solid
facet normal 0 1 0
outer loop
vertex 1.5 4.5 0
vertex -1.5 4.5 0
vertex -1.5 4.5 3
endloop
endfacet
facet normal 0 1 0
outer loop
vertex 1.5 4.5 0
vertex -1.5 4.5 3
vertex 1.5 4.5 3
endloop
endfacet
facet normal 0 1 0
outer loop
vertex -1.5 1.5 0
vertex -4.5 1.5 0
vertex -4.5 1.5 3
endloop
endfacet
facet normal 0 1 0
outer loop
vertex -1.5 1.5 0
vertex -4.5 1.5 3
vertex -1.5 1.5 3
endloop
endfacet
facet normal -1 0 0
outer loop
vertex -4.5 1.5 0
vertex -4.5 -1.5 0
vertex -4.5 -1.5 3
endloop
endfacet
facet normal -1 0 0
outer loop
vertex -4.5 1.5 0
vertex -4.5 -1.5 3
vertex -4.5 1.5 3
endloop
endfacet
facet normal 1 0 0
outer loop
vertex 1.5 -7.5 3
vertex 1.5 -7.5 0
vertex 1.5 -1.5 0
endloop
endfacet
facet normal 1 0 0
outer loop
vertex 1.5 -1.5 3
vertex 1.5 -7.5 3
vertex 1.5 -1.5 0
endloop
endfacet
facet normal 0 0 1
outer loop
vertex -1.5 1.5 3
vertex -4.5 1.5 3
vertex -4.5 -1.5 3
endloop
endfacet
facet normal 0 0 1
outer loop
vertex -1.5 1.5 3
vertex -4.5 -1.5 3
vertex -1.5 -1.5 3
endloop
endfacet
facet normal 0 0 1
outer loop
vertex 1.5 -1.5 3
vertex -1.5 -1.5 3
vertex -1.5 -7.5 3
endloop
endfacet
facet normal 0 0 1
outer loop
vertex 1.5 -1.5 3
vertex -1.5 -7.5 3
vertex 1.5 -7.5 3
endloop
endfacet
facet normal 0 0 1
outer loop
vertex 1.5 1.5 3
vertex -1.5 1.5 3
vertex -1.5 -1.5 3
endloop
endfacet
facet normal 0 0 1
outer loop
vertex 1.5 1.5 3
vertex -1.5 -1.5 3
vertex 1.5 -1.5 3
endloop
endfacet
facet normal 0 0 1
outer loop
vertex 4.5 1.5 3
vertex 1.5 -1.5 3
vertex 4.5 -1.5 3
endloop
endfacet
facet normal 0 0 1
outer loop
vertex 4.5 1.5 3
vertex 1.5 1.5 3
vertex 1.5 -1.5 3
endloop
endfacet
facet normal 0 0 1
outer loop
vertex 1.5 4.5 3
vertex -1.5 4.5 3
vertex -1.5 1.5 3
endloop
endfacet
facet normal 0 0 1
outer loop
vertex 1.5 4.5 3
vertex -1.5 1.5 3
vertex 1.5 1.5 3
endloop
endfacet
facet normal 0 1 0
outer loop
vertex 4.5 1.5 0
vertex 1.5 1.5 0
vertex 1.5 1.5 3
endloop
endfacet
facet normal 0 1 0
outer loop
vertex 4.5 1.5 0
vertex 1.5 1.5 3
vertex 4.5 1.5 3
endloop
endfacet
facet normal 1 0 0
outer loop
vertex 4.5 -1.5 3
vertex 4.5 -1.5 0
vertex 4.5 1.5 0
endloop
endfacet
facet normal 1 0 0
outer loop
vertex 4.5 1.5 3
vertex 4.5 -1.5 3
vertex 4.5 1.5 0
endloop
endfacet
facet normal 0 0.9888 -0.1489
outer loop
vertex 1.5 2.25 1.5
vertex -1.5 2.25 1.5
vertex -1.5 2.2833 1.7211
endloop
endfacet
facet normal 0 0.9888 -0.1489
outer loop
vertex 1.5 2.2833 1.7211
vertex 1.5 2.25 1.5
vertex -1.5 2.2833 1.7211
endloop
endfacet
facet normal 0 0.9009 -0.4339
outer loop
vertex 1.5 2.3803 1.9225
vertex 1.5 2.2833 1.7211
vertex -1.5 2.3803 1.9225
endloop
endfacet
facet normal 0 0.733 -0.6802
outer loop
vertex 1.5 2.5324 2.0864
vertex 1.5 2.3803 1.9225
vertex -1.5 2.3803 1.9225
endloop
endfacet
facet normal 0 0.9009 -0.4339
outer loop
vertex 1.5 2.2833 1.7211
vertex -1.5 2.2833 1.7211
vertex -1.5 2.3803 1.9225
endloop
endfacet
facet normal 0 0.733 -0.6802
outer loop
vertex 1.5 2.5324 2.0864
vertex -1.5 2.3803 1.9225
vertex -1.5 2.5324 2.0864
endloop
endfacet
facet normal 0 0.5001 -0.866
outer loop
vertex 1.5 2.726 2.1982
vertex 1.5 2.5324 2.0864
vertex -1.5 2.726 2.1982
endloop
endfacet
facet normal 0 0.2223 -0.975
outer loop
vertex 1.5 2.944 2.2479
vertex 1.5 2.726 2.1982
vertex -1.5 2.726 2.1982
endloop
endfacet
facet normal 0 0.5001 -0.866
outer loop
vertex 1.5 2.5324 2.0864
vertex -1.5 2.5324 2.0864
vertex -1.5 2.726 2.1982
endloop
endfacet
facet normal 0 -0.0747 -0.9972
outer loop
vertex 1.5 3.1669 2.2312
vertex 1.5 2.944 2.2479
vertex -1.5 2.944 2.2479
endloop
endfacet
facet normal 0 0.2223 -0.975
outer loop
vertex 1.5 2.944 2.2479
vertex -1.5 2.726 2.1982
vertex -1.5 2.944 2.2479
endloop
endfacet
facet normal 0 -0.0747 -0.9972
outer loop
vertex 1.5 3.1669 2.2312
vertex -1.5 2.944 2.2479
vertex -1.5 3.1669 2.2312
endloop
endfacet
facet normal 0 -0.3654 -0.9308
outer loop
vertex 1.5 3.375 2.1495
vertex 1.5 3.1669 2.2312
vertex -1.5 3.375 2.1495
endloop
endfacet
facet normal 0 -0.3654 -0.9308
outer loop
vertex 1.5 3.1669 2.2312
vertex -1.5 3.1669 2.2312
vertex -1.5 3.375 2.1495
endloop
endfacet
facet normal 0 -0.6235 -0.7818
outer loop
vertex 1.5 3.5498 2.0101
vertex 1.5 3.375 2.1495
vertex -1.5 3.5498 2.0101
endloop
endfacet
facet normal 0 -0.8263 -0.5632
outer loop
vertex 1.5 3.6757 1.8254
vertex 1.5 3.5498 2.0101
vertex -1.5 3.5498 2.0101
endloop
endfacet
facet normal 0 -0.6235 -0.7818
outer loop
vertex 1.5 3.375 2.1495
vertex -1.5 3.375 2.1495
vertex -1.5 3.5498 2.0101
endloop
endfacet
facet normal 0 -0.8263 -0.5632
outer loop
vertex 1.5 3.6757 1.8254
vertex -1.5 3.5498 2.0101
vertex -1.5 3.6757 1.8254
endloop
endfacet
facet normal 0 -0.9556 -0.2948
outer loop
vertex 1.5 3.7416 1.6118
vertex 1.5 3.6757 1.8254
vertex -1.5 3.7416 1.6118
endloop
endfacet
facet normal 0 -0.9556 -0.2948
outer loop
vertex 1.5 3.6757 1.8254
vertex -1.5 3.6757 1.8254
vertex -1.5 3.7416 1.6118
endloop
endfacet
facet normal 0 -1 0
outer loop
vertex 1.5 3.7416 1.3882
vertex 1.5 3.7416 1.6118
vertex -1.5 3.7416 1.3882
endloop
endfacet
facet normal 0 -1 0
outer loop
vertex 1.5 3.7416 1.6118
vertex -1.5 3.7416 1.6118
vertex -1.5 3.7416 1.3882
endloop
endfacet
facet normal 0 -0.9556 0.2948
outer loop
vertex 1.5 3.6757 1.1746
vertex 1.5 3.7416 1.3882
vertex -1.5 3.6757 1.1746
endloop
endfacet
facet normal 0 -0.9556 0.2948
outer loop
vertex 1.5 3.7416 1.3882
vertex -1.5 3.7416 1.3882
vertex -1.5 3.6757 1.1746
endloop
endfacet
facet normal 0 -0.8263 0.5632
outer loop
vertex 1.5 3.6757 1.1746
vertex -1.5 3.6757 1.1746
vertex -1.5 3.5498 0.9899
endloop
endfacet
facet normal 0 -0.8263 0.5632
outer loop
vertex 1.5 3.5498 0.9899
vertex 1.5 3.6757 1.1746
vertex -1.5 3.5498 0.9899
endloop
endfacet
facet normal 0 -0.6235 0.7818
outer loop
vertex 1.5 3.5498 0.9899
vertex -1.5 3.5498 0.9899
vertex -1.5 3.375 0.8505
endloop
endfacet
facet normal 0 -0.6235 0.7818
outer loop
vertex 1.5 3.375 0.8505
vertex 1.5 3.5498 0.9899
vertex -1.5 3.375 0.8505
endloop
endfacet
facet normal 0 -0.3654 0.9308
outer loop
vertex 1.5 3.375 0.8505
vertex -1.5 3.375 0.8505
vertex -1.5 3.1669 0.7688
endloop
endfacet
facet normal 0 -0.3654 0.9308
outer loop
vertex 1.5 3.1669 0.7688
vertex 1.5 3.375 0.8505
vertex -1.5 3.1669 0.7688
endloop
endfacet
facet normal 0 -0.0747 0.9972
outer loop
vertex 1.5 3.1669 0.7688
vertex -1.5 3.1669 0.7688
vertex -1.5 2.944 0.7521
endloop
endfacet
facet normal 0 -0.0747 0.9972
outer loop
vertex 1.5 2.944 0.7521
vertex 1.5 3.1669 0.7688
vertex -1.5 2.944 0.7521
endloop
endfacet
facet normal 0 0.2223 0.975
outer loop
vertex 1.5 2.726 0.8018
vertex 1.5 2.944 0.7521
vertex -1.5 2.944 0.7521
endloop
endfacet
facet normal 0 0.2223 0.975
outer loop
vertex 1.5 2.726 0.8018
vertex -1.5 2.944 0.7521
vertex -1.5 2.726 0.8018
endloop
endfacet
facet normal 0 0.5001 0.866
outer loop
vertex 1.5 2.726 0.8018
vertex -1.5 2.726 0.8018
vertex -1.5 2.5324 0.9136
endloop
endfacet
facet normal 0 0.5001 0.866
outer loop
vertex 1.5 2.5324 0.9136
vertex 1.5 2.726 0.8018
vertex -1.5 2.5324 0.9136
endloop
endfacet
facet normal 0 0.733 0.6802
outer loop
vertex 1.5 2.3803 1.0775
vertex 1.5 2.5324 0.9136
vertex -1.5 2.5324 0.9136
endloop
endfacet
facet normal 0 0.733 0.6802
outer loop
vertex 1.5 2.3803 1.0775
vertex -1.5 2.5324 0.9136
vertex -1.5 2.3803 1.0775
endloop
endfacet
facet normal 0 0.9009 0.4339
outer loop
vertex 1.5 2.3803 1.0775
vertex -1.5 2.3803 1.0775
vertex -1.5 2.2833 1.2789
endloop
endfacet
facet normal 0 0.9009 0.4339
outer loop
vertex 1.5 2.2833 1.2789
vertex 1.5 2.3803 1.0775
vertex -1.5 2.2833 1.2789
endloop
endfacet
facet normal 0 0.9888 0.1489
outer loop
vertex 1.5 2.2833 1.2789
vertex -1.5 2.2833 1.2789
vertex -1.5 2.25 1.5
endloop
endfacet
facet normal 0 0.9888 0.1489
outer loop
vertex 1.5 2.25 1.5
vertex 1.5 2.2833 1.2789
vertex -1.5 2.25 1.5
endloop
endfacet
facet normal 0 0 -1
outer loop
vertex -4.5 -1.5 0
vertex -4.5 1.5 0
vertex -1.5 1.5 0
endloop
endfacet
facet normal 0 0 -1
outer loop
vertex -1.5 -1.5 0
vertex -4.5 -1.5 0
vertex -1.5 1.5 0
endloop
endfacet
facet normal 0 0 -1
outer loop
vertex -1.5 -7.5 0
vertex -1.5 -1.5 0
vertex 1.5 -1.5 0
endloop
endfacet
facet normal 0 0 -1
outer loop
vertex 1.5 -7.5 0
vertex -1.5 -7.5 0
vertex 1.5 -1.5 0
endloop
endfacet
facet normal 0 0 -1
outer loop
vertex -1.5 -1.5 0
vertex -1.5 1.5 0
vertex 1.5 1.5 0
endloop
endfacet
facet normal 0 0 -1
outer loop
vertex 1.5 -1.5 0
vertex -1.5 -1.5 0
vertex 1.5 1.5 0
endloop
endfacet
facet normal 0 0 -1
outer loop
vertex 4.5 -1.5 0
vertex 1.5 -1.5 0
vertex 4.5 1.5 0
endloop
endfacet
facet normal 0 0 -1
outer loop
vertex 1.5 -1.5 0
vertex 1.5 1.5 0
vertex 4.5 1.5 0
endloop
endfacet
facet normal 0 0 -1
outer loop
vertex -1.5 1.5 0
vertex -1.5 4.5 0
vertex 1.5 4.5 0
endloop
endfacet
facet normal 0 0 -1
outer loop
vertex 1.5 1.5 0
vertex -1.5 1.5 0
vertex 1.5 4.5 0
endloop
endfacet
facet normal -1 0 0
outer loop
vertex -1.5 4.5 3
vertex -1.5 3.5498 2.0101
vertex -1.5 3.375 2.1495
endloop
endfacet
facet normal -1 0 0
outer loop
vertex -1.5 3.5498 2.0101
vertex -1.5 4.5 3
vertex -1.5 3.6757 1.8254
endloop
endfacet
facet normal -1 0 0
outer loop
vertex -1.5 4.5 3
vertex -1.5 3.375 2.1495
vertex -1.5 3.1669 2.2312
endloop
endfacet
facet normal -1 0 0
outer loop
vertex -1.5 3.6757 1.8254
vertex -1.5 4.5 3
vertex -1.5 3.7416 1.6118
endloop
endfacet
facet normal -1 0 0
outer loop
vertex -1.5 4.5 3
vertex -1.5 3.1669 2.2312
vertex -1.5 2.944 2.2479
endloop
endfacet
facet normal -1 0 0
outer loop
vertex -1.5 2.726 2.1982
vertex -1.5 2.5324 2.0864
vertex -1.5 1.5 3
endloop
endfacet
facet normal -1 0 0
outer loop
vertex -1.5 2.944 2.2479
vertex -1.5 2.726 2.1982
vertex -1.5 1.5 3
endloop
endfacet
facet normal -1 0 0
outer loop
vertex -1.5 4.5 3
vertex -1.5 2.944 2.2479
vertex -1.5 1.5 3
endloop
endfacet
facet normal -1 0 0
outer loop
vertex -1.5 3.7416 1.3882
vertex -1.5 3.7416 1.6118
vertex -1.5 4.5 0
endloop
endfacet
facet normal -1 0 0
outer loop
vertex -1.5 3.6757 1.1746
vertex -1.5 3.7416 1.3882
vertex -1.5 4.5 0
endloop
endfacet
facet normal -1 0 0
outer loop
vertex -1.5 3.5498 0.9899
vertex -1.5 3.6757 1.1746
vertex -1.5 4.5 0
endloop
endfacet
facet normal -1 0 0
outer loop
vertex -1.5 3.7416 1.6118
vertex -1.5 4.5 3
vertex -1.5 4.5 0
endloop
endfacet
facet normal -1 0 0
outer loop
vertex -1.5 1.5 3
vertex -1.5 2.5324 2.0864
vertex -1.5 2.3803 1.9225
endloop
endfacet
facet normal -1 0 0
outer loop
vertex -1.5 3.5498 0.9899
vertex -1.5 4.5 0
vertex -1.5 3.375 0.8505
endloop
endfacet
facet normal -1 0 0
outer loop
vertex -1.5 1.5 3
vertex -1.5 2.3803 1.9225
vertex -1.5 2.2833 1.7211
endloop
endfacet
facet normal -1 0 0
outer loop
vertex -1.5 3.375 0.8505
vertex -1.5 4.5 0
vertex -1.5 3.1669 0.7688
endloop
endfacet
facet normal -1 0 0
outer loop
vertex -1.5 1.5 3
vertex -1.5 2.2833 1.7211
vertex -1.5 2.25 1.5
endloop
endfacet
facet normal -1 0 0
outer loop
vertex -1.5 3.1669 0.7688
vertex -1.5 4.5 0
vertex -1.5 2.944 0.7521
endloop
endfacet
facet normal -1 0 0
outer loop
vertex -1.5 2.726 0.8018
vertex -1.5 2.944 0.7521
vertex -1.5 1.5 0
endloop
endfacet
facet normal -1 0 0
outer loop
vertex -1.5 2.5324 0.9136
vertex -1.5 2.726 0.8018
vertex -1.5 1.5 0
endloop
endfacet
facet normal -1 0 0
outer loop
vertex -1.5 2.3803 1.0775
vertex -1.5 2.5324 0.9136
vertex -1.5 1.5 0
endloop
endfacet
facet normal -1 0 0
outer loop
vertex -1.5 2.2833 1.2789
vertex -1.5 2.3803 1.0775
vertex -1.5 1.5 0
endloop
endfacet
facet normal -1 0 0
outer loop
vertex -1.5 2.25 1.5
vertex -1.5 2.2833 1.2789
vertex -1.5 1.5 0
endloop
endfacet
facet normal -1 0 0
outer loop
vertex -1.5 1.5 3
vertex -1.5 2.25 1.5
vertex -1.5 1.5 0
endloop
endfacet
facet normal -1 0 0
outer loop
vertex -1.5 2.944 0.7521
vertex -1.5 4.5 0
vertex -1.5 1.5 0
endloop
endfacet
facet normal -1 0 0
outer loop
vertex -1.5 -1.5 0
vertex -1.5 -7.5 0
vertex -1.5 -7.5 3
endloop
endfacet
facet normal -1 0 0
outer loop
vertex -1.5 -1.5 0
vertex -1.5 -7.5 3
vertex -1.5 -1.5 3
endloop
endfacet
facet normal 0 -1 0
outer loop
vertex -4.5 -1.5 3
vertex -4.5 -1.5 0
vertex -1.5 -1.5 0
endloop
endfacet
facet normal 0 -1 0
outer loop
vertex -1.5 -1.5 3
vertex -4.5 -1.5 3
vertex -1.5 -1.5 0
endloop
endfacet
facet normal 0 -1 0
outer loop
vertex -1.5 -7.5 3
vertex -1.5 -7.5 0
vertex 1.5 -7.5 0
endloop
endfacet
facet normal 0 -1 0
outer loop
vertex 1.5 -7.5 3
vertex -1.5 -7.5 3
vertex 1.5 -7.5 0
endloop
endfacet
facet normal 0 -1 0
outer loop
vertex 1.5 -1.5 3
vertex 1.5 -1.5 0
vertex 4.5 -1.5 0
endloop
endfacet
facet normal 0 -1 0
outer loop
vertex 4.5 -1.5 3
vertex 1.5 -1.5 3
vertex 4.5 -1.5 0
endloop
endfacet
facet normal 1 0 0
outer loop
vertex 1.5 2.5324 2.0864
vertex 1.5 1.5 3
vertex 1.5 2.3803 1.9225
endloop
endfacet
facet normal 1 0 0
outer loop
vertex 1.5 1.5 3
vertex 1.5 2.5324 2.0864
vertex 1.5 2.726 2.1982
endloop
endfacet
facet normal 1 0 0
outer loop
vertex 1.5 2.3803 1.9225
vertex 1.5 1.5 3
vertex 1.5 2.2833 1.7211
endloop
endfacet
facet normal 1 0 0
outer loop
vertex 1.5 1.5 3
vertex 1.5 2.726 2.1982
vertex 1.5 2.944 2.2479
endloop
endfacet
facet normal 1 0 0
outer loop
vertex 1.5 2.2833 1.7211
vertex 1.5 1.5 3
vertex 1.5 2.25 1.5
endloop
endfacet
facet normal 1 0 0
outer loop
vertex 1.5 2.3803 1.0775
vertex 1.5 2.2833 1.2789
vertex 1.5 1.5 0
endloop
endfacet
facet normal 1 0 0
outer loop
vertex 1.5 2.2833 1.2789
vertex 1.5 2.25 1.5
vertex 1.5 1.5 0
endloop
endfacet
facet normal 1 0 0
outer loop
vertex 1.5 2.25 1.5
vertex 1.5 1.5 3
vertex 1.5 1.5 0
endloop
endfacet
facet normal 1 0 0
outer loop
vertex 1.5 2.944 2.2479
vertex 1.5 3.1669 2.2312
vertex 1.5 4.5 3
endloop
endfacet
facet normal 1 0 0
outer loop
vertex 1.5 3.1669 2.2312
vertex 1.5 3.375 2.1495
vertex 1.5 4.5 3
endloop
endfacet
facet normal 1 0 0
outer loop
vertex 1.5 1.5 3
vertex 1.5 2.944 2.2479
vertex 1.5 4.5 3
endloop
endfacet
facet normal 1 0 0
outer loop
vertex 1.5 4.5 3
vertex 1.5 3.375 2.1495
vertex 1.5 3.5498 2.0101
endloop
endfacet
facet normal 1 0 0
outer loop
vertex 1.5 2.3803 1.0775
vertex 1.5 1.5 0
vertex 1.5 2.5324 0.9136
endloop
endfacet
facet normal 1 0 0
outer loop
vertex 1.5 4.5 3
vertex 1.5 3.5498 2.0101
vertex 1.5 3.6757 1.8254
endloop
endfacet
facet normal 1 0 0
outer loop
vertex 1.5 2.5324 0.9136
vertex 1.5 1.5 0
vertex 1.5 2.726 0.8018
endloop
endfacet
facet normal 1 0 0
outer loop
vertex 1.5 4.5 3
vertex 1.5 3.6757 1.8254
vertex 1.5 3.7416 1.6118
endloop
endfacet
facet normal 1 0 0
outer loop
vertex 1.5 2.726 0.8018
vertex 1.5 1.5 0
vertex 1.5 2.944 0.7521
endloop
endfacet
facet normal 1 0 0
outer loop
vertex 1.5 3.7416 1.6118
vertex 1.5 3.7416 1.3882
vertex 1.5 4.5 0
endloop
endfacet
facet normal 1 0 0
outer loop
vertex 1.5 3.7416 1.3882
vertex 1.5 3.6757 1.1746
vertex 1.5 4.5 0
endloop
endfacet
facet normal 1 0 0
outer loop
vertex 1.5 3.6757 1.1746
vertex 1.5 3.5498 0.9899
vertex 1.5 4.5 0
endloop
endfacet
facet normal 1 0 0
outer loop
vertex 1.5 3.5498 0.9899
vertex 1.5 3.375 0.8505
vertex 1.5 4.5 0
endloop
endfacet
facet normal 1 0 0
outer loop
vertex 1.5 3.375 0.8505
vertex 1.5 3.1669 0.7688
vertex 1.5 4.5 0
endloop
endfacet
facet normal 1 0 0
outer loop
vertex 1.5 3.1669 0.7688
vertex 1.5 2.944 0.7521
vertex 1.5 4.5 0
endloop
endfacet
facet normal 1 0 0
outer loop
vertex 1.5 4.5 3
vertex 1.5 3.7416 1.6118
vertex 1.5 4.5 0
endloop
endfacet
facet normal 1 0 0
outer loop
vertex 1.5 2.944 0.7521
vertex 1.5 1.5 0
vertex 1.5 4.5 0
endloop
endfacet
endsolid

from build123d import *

# Parameters (mm, degrees)
F0_W     = 3
F0_H     = 3
F0_H_2   = 6
F1_DEPTH = 3
F2_R     = 0.75
F3_DEPTH = 25


with BuildPart() as f1:
    # F0 (on Top) → F1 (new body)
    with BuildSketch(Plane.XY):
        with Locations((0, 3)):
            Rectangle(F0_W, F0_H)
        Rectangle(F0_W, F0_H)
        with Locations((-3, 0)):
            Rectangle(F0_W, F0_H)
        with Locations((0, -4.5)):
            Rectangle(F0_W, F0_H_2)
        with Locations((3, 0)):
            Rectangle(F0_W, F0_H)
    extrude(amount=F1_DEPTH)

    # F2 (on face) → F3 (cut)
    with BuildSketch(Plane(origin=(-1.5, 0, 0), x_dir=(0, -1, 0), z_dir=(-1, 0, 0))):
        with Locations((-3, 1.5)):
            Circle(F2_R)
    extrude(amount=-F3_DEPTH, mode=Mode.SUBTRACT)


solid = f1.part
